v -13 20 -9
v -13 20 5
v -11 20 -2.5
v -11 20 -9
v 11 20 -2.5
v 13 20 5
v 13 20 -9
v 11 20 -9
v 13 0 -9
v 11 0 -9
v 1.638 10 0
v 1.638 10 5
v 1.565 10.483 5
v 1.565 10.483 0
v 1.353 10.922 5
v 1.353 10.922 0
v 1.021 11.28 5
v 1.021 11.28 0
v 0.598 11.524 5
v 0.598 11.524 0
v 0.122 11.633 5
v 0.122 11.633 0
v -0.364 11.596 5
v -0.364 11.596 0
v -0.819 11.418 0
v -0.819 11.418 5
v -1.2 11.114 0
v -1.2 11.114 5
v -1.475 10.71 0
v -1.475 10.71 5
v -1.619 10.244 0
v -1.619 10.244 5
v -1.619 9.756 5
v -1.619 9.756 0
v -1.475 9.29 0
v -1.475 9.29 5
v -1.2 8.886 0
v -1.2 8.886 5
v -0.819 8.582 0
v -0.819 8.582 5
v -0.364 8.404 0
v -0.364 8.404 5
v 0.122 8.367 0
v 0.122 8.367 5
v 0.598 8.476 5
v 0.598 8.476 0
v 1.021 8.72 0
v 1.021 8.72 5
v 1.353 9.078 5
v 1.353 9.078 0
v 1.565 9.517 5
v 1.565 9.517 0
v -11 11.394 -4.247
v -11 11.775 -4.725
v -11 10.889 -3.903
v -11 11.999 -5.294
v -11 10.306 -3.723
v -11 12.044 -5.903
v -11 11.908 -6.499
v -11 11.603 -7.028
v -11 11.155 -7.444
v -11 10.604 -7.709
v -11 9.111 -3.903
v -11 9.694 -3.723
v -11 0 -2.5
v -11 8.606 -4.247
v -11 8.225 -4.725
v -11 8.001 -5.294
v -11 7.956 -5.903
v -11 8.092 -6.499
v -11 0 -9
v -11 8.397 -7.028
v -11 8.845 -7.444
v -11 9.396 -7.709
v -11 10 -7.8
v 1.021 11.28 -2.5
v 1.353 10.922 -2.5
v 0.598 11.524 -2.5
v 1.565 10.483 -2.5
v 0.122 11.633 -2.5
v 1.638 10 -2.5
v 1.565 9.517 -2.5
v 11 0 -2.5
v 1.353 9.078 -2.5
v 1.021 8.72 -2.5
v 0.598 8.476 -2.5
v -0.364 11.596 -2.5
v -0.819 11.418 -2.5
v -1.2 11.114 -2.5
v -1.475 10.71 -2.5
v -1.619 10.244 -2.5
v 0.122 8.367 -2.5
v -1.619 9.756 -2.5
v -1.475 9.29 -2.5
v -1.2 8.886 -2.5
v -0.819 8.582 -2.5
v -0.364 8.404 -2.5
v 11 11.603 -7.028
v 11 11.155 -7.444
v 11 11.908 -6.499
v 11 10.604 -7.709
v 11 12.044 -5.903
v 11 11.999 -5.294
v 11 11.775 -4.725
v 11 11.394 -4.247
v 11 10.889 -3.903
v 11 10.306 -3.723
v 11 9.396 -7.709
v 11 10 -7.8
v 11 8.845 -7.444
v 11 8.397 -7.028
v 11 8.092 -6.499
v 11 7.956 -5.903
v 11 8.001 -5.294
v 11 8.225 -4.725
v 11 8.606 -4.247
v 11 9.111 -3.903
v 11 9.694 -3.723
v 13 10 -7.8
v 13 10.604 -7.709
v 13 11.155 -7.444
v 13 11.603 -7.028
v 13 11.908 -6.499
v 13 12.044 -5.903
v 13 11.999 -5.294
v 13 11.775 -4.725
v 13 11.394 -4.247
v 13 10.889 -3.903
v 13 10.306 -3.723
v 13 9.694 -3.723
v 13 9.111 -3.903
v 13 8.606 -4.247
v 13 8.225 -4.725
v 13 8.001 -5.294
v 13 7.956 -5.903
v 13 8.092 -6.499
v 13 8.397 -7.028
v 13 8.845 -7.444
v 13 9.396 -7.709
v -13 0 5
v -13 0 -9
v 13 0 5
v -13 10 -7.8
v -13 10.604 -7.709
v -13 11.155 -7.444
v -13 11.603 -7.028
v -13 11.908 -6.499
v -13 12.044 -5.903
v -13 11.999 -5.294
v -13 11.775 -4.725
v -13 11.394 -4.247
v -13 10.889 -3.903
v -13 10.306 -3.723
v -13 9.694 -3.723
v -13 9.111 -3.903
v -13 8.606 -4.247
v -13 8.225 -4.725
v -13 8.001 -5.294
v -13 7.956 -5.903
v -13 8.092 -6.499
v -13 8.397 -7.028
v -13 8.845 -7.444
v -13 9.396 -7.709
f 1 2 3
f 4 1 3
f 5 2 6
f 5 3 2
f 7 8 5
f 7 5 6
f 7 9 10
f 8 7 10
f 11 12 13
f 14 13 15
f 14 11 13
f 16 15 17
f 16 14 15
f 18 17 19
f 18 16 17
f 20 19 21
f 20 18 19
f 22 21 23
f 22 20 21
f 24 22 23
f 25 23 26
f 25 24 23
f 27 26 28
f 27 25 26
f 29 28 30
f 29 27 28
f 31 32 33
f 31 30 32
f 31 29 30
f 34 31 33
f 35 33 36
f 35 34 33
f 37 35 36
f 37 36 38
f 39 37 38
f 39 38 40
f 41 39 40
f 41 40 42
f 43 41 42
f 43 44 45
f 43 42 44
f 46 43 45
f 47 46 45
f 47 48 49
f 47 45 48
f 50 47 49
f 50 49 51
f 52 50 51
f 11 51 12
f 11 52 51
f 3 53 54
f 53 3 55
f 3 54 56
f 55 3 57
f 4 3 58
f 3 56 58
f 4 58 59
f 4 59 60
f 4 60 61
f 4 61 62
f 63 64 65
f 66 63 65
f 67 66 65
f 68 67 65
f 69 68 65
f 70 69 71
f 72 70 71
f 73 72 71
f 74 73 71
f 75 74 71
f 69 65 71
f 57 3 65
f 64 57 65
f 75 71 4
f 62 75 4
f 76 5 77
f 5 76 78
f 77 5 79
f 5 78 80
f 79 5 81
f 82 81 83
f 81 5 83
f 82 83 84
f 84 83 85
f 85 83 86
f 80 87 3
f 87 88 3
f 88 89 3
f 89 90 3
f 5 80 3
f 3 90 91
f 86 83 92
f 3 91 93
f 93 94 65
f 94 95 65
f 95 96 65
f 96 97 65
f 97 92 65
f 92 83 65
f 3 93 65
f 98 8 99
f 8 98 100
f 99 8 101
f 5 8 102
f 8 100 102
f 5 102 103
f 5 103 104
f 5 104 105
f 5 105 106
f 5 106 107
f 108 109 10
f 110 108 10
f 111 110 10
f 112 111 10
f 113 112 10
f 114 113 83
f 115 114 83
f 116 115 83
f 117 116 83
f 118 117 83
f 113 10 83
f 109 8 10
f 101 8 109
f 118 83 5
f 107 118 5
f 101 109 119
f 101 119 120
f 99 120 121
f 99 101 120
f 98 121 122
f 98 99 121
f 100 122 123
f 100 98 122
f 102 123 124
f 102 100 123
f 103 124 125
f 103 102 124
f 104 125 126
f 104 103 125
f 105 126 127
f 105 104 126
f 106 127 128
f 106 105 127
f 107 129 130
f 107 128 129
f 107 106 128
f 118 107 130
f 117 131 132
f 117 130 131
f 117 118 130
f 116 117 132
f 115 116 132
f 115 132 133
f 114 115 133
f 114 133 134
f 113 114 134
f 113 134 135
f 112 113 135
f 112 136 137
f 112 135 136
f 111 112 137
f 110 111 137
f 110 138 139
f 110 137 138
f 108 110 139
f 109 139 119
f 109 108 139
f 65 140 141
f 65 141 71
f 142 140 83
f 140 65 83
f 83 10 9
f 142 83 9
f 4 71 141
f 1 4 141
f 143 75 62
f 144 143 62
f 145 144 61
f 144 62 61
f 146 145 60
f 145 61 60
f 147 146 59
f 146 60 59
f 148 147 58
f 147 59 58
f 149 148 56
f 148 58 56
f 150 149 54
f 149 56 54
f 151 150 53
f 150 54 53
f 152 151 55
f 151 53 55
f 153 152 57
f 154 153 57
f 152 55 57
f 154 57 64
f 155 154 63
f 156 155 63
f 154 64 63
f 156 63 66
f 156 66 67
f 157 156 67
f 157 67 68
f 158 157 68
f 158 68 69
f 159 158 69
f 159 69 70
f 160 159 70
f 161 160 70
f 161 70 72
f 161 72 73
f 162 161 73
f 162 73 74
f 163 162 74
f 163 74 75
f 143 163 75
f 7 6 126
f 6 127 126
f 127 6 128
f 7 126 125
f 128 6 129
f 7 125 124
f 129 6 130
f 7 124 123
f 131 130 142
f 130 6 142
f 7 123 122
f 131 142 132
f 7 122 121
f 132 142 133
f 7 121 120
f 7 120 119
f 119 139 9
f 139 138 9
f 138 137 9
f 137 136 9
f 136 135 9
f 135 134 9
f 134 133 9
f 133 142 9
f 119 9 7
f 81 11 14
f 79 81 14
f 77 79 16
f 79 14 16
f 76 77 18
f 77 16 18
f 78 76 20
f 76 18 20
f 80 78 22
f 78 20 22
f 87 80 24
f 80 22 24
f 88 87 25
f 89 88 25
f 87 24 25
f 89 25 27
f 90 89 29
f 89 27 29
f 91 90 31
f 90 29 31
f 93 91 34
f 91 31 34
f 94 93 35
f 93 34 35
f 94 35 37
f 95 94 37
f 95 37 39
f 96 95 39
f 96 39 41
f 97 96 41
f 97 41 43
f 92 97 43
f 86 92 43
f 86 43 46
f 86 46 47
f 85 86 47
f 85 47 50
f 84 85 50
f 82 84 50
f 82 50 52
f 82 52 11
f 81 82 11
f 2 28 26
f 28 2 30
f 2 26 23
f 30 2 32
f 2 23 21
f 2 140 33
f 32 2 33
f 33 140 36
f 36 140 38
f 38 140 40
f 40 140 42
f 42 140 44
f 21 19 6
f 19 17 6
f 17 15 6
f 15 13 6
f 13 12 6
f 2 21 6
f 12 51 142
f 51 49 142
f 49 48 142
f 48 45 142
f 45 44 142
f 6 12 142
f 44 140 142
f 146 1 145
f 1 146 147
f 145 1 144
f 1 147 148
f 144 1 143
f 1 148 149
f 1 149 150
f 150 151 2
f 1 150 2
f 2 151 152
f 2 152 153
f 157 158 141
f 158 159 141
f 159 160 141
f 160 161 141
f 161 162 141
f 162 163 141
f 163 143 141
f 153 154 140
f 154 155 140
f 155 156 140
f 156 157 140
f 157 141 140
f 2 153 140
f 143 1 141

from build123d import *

# Parameters (mm, degrees)
BOSS_EXTRUDE1_DEPTH     = 20
SKETCH3_R               = 1.6375
CUT_EXTRUDE1_DEPTH      = 6
CUT_EXTRUDE1_DEPTH_BACK = 10
SKETCH7_R               = 2.05
CUT_EXTRUDE2_DEPTH      = 14
CUT_EXTRUDE2_DEPTH_BACK = 14


with BuildPart() as part:
    # Sketch1 → Boss-Extrude1 (new body)
    with BuildSketch(Plane(origin=(0, 0, 0), x_dir=(1, 0, 0), z_dir=(0, 1, 0))):
        Polygon((13, -5), (13, 9), (11, 9), (11, 2.5), (-11, 2.5), (-11, 9), (-13, 9), (-13, -5), align=None)
    extrude(amount=BOSS_EXTRUDE1_DEPTH)

    # Sketch3 → Cut-Extrude1 (cut, two sides)
    with BuildSketch(Plane.XY) as cut_extrude1_sk:
        with Locations((0, 10)):
            Circle(SKETCH3_R)
    extrude(amount=CUT_EXTRUDE1_DEPTH, mode=Mode.SUBTRACT)
    extrude(cut_extrude1_sk.sketch, amount=-CUT_EXTRUDE1_DEPTH_BACK, mode=Mode.SUBTRACT)

    # Sketch7 → Cut-Extrude2 (cut, two sides)
    with BuildSketch(Plane(origin=(0, 0, 0), x_dir=(0, 0, -1), z_dir=(1, 0, 0))) as cut_extrude2_sk:
        with Locations((5.75, 10)):
            Circle(SKETCH7_R)
    extrude(amount=CUT_EXTRUDE2_DEPTH, mode=Mode.SUBTRACT)
    extrude(cut_extrude2_sk.sketch, amount=-CUT_EXTRUDE2_DEPTH_BACK, mode=Mode.SUBTRACT)


solid = part.part
